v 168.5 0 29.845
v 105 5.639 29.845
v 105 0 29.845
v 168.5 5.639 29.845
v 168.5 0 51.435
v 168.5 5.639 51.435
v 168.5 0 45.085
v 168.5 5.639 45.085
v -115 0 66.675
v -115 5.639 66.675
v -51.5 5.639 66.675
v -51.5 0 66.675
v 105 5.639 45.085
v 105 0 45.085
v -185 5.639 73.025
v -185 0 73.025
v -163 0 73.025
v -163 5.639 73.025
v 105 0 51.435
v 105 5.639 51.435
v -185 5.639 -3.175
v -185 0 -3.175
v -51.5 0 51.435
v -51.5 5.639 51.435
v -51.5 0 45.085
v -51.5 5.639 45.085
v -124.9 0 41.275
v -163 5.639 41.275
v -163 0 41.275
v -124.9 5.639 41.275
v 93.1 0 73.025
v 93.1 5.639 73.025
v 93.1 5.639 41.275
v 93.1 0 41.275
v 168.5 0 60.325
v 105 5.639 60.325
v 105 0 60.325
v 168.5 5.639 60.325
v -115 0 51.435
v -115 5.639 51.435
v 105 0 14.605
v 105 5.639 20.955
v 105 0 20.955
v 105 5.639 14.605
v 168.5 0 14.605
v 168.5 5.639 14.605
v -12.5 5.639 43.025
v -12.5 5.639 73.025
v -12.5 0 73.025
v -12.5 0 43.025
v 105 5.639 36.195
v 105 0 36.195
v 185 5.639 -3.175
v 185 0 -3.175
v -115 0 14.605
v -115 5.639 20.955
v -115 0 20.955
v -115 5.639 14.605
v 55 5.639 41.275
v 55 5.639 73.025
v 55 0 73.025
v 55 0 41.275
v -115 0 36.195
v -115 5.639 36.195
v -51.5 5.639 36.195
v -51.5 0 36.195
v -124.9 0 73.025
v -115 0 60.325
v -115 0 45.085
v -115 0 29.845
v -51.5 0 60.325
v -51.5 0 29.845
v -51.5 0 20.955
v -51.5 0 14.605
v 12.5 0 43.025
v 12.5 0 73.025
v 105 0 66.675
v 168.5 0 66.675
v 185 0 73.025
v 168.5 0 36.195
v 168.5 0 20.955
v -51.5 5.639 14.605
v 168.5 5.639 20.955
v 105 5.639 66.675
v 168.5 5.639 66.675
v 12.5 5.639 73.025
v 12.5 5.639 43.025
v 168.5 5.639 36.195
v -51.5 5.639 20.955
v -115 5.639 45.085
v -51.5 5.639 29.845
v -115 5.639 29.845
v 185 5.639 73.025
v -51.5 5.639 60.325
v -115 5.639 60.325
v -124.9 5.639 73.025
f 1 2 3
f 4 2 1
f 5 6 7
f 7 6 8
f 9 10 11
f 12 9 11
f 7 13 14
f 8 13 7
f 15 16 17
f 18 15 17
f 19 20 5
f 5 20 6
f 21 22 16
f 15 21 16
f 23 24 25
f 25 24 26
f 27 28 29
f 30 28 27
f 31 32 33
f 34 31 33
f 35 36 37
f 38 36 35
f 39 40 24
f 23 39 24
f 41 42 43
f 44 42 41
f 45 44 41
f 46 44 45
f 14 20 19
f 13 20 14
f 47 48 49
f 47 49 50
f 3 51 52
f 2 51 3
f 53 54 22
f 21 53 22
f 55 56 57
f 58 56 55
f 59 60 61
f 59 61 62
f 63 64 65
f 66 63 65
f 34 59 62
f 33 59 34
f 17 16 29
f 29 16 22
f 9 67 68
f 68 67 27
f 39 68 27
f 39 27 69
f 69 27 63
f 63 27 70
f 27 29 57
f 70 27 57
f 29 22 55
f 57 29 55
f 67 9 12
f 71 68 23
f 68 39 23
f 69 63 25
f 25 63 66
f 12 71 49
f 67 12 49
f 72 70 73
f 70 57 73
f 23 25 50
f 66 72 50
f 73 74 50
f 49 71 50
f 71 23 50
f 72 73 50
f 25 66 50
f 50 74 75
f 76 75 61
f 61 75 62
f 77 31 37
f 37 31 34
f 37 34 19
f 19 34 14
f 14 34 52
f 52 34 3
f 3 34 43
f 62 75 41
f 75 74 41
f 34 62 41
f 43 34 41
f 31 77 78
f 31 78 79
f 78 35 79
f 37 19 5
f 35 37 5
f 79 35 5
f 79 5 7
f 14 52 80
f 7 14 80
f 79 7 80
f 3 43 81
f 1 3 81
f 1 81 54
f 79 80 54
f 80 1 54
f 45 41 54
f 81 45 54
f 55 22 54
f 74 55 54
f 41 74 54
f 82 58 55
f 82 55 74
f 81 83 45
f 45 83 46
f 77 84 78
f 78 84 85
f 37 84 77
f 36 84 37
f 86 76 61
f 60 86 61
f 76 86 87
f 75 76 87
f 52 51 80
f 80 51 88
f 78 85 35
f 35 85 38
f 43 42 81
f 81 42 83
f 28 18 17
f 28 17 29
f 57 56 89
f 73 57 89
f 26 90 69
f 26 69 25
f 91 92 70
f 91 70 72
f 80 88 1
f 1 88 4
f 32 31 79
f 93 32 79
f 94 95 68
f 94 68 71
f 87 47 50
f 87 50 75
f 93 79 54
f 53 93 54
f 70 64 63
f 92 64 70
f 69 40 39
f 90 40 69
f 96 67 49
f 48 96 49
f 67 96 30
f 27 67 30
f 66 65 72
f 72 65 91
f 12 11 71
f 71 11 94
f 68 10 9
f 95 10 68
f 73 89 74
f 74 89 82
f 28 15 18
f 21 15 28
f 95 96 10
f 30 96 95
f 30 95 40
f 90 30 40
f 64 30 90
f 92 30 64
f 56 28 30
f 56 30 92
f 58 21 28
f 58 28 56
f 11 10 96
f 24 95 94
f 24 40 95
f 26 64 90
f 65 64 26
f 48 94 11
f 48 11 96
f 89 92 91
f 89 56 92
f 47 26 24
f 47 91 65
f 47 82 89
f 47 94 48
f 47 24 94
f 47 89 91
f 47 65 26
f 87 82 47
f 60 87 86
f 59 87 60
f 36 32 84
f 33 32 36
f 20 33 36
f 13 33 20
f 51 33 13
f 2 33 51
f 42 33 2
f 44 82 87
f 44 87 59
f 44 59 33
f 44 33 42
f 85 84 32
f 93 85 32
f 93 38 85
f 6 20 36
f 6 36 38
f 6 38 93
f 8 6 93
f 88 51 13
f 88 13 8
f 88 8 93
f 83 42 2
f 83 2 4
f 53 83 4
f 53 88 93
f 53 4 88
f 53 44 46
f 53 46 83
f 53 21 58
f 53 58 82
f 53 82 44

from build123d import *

# Parameters (mm, degrees)
BOSS_EXTRUDE1_DEPTH  = 5.6388
SKETCH2_W            = 63.5
SKETCH2_H            = 6.35
CUT_EXTRUDE1_DEPTH   = 6.6388
LPATTERN1_COUNT      = 4
LPATTERN1_PITCH      = 15.24
LPATTERN1_COUNT_DIR2 = 2
LPATTERN1_PITCH_DIR2 = 220
SKETCH3_W            = 25
SKETCH3_H            = 30
CUT_EXTRUDE2_DEPTH   = 6.6388
SKETCH4_W            = 38.1
SKETCH4_H            = 31.75
CUT_EXTRUDE3_DEPTH   = 6.6388


with BuildPart() as part:
    # Sketch1 → Boss-Extrude1 (new body)
    with BuildSketch(Plane(origin=(0, 0, 0), x_dir=(1, 0, 0), z_dir=(0, 1, 0))):
        Polygon((-185, -73.025), (185, -73.025), (185, -6.825), (185, 3.175), (175, 3.175), (-175, 3.175), (-185, 3.175), (-185, -6.825), align=None)
    extrude(amount=BOSS_EXTRUDE1_DEPTH)

    # Sketch2 → Cut-Extrude1 (cut, through all)
    with BuildSketch(Plane(origin=(0, 5.6388, 0), x_dir=(1, 0, 0), z_dir=(0, 1, 0))):
        with Locations((-83.25, -63.5)):
            Rectangle(SKETCH2_W, SKETCH2_H)
    cut_extrude1 = extrude(amount=-CUT_EXTRUDE1_DEPTH, mode=Mode.SUBTRACT)

    # LPattern1: Cut-Extrude1 4 × 2
    with Locations(*[(j * LPATTERN1_PITCH_DIR2, 0, -i * LPATTERN1_PITCH) for i in range(LPATTERN1_COUNT) for j in range(LPATTERN1_COUNT_DIR2) if (i, j) != (0, 0)]):
        add(cut_extrude1, mode=Mode.SUBTRACT)

    # Sketch3 → Cut-Extrude2 (cut, through all)
    with BuildSketch(Plane(origin=(0, 5.6388, 0), x_dir=(1, 0, 0), z_dir=(0, 1, 0))):
        with Locations((0, -58.025)):
            Rectangle(SKETCH3_W, SKETCH3_H)
    extrude(amount=-CUT_EXTRUDE2_DEPTH, mode=Mode.SUBTRACT)

    # Sketch4 → Cut-Extrude3 (cut, through all)
    with BuildSketch(Plane(origin=(0, 5.6388, 0), x_dir=(1, 0, 0), z_dir=(0, 1, 0))):
        with Locations((-143.95, -57.15)):
            Rectangle(SKETCH4_W, SKETCH4_H)
        with Locations((74.05, -57.15)):
            Rectangle(SKETCH4_W, SKETCH4_H)
    extrude(amount=-CUT_EXTRUDE3_DEPTH, mode=Mode.SUBTRACT)


solid = part.part
